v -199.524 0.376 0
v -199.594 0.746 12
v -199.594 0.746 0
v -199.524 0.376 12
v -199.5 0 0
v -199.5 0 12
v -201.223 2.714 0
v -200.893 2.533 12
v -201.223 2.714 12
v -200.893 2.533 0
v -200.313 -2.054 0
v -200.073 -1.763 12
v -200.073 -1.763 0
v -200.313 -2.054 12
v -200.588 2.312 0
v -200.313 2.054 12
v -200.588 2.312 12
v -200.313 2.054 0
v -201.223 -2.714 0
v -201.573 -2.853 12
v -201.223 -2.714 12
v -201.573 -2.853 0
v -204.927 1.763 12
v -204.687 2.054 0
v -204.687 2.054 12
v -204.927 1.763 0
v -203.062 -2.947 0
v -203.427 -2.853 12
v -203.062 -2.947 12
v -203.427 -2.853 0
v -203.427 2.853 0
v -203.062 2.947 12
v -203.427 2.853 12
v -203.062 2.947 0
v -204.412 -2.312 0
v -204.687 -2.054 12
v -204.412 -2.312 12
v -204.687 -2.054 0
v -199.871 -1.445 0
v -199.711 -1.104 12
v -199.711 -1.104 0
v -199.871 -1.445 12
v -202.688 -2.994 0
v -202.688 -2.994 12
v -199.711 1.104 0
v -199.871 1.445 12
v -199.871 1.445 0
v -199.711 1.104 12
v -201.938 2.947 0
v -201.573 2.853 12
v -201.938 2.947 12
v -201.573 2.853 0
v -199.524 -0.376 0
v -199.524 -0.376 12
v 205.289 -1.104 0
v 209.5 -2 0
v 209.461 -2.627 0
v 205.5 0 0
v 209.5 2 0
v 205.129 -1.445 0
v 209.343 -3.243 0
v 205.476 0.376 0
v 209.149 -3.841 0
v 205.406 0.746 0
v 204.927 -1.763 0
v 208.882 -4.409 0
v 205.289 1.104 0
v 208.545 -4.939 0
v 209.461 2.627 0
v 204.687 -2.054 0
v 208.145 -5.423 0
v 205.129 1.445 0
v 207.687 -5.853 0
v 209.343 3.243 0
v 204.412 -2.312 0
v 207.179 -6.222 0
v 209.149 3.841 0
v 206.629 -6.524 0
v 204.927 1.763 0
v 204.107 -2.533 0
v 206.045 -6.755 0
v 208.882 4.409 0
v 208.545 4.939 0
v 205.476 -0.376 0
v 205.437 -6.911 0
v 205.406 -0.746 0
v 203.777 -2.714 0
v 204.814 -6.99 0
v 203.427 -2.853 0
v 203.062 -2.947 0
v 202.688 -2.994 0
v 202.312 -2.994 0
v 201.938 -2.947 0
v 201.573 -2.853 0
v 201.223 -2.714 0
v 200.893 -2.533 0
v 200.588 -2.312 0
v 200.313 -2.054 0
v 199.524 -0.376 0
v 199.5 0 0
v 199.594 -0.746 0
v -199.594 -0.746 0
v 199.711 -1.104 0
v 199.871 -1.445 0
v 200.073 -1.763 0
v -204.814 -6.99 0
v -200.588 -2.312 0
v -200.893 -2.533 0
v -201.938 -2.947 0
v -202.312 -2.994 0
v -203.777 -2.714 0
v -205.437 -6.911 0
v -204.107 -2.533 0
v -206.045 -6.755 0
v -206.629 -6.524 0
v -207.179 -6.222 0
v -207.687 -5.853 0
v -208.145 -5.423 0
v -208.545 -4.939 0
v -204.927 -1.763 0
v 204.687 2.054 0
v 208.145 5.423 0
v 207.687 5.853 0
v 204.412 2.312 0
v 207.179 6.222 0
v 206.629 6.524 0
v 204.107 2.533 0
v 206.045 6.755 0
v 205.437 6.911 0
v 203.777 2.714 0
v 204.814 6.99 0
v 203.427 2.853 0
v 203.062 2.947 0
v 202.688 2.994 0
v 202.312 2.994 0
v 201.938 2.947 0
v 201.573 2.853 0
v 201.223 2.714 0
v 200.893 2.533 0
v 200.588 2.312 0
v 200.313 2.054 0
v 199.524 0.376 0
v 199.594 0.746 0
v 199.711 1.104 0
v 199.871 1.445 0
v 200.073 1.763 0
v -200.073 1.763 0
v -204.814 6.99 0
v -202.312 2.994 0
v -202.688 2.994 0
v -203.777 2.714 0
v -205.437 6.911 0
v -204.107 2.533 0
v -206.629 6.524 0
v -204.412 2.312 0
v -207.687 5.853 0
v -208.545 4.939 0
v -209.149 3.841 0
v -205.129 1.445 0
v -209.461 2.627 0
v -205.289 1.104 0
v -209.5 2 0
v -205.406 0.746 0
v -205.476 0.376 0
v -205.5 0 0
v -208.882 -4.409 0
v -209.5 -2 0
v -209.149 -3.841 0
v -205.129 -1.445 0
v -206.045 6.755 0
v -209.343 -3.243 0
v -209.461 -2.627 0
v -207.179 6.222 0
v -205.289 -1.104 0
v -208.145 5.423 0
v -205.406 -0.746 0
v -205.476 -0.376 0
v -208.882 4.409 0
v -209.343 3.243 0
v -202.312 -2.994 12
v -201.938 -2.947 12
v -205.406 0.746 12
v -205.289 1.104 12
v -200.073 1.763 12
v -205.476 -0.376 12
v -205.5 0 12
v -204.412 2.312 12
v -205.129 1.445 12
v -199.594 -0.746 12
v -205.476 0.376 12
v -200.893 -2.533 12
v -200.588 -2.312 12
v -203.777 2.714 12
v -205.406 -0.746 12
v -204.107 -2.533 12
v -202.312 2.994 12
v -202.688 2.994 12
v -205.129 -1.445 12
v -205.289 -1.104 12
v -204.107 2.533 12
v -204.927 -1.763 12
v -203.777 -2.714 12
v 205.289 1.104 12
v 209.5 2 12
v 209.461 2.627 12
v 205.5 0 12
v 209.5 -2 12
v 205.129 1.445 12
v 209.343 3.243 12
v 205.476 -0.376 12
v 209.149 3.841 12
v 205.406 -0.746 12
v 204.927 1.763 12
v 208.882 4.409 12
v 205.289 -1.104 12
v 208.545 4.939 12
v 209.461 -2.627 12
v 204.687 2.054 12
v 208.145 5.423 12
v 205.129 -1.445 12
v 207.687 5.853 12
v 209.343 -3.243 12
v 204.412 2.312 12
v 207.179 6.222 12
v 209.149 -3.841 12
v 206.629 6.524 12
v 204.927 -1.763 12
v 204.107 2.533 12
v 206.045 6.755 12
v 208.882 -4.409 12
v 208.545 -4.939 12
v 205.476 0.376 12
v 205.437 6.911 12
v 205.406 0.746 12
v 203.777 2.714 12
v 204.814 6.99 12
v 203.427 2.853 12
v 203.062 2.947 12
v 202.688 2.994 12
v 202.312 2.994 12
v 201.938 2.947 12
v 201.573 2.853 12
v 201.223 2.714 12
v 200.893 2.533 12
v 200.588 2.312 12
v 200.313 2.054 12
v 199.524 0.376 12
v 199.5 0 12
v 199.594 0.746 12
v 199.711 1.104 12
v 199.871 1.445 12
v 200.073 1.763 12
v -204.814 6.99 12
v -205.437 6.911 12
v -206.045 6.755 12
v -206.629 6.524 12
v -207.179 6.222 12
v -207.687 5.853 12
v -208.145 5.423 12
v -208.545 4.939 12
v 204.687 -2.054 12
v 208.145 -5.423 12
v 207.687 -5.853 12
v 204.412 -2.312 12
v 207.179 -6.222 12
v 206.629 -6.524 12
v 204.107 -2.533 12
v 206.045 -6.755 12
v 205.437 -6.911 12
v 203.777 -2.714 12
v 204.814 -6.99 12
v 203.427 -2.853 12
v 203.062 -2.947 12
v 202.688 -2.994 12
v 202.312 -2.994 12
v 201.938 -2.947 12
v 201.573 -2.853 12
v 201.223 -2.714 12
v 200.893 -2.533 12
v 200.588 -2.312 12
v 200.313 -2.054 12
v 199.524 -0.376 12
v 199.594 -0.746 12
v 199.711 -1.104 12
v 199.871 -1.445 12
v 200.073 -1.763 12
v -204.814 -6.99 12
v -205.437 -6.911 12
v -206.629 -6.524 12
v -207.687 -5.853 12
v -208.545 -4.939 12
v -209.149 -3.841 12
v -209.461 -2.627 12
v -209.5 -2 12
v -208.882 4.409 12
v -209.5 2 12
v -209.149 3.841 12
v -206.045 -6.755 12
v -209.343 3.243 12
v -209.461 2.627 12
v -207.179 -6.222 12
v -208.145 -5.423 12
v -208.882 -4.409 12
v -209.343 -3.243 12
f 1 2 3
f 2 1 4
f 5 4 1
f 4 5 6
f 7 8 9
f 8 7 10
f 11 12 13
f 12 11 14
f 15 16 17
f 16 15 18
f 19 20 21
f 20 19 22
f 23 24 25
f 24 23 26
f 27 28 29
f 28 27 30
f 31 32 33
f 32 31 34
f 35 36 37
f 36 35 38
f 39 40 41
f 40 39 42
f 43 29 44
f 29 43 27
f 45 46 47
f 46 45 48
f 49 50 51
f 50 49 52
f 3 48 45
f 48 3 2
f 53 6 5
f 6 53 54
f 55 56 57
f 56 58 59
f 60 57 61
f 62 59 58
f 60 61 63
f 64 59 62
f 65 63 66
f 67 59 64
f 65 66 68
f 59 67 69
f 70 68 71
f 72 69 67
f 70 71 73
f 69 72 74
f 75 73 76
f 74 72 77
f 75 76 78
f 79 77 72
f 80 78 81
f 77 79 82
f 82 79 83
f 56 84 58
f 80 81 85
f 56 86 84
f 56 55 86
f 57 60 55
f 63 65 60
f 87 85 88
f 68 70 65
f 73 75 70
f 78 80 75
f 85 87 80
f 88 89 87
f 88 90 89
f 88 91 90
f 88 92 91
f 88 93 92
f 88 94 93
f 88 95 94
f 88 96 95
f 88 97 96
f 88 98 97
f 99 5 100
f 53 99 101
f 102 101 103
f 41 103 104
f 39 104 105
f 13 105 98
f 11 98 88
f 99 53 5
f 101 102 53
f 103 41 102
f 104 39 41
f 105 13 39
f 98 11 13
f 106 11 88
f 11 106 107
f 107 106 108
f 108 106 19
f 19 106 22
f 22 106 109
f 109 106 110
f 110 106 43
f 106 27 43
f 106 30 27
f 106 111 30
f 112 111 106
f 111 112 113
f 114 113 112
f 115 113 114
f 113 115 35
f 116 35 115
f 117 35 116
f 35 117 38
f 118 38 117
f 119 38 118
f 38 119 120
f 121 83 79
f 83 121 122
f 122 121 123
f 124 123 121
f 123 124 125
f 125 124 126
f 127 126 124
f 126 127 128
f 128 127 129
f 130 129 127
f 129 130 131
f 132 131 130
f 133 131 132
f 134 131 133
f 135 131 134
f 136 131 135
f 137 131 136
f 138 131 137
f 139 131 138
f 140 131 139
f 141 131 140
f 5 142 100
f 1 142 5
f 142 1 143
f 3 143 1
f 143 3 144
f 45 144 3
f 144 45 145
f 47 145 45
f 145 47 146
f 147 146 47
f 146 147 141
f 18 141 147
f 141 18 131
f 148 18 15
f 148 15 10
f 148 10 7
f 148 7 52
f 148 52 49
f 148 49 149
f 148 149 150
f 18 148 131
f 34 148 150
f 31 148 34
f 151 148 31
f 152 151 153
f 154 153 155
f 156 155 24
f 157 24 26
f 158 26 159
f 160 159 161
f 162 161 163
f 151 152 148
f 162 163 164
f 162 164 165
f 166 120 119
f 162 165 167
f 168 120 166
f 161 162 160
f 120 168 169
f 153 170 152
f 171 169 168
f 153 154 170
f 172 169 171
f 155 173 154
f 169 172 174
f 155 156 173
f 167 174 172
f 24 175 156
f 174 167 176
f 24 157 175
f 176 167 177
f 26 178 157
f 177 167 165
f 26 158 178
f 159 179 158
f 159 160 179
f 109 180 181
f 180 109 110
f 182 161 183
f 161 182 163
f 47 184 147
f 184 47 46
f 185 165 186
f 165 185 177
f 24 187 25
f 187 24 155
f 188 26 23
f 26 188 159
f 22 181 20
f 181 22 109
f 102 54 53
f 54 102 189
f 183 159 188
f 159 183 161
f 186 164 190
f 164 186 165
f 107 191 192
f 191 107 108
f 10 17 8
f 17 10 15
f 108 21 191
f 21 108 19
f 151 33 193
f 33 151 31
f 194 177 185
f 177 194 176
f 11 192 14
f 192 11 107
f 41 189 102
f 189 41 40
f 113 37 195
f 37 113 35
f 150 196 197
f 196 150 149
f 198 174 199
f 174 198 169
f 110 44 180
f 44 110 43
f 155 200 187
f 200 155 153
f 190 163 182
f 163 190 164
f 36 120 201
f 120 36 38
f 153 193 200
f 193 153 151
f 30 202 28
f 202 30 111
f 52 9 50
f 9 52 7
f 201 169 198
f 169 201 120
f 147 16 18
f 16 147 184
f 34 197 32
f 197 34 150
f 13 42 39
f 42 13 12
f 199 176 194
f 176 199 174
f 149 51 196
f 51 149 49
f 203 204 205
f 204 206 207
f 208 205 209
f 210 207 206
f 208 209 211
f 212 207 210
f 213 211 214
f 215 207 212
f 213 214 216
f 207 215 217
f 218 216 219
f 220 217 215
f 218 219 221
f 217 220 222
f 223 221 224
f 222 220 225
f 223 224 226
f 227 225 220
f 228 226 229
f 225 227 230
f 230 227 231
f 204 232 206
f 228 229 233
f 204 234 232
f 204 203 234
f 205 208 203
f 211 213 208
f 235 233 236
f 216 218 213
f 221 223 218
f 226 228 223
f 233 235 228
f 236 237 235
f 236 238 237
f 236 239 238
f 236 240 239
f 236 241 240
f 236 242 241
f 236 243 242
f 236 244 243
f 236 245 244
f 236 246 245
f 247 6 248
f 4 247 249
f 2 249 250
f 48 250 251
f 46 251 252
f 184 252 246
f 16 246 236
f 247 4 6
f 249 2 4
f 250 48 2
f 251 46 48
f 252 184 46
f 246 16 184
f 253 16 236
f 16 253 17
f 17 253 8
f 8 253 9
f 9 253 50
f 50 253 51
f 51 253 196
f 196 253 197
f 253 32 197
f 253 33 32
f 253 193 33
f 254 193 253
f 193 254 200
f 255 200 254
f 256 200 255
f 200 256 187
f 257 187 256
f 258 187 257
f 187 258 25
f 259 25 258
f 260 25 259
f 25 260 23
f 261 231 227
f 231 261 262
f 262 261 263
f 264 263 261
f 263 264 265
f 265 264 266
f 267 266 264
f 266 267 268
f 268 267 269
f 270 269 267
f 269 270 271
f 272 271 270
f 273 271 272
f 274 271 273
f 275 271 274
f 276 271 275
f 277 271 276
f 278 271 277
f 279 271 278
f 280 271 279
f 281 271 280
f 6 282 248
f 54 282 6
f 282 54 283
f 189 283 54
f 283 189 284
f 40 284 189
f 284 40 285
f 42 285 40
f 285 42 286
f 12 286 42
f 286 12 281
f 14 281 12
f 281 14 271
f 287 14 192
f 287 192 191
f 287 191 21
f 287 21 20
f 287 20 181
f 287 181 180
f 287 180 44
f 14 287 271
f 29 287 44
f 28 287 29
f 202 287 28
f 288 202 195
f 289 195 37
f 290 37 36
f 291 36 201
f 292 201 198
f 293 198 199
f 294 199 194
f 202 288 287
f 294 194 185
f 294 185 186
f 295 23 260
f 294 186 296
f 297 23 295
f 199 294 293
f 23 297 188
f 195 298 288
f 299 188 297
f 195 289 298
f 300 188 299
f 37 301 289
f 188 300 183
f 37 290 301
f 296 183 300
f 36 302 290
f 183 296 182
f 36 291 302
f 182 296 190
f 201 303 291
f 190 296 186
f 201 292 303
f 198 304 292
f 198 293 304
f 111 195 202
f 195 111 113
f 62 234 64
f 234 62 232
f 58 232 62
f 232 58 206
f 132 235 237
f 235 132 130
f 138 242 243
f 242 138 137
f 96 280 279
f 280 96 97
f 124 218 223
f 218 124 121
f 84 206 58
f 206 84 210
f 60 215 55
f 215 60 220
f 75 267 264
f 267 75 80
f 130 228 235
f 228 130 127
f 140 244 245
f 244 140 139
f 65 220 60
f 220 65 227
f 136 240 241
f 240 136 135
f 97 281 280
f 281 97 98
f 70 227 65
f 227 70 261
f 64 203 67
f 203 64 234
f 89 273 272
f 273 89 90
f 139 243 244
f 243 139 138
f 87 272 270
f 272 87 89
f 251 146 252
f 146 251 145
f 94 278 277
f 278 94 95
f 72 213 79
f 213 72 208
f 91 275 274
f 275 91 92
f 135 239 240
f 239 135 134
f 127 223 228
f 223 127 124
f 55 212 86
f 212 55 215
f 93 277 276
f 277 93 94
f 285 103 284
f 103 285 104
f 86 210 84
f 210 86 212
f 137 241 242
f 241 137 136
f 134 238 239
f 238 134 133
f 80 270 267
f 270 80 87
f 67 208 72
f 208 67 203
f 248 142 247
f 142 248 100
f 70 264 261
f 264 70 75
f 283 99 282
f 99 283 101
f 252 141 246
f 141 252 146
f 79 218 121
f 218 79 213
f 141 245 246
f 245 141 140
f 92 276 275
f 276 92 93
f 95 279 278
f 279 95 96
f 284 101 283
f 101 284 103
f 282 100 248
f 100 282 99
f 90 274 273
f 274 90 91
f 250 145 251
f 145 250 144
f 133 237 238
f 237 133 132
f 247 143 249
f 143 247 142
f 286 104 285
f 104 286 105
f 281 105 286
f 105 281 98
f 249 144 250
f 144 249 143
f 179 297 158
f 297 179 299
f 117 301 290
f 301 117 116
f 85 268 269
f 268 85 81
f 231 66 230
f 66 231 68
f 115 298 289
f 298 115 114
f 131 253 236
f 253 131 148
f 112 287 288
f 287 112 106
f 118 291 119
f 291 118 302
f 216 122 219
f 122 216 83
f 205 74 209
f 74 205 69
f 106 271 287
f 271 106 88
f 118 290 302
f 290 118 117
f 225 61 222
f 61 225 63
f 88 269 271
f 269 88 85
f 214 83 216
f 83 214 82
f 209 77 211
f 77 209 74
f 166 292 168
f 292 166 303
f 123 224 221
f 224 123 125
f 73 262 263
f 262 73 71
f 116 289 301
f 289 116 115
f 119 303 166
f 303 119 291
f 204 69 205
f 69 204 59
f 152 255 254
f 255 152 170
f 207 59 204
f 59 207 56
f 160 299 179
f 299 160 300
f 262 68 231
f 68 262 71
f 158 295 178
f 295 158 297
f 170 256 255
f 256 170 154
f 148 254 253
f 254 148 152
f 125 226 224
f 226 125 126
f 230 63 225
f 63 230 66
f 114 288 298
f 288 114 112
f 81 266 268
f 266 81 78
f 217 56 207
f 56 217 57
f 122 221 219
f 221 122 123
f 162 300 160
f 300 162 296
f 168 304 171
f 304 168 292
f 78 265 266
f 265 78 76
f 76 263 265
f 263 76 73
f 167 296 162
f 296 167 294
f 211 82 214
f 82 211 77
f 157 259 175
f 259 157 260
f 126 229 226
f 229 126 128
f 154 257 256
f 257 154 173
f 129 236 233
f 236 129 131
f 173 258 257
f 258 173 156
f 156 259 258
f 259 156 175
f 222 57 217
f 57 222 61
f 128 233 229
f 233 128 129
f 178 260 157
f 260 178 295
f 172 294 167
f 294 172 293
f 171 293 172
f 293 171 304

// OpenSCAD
$fn = 50;


difference() {
	union() {
		hull() {
			translate(v = [-204.5000000000, 2.0000000000, 0]) {
				cylinder(h = 12, r = 5);
			}
			translate(v = [204.5000000000, 2.0000000000, 0]) {
				cylinder(h = 12, r = 5);
			}
			translate(v = [-204.5000000000, -2.0000000000, 0]) {
				cylinder(h = 12, r = 5);
			}
			translate(v = [204.5000000000, -2.0000000000, 0]) {
				cylinder(h = 12, r = 5);
			}
		}
	}
	union() {
		translate(v = [-202.5000000000, 0.0000000000, 0]) {
			cylinder(h = 12, r = 3.0000000000);
		}
		translate(v = [202.5000000000, 0.0000000000, 0]) {
			cylinder(h = 12, r = 3.0000000000);
		}
		translate(v = [-202.5000000000, 0.0000000000, 0]) {
			cylinder(h = 12, r = 1.5000000000);
		}
		translate(v = [202.5000000000, 0.0000000000, 0]) {
			cylinder(h = 12, r = 1.5000000000);
		}
		translate(v = [-202.5000000000, 0.0000000000, 0]) {
			cylinder(h = 12, r = 1.5000000000);
		}
		translate(v = [202.5000000000, 0.0000000000, 0]) {
			cylinder(h = 12, r = 1.5000000000);
		}
		translate(v = [-202.5000000000, 0.0000000000, 0]) {
			cylinder(h = 12, r = 1.5000000000);
		}
		translate(v = [202.5000000000, 0.0000000000, 0]) {
			cylinder(h = 12, r = 1.5000000000);
		}
	}
}
